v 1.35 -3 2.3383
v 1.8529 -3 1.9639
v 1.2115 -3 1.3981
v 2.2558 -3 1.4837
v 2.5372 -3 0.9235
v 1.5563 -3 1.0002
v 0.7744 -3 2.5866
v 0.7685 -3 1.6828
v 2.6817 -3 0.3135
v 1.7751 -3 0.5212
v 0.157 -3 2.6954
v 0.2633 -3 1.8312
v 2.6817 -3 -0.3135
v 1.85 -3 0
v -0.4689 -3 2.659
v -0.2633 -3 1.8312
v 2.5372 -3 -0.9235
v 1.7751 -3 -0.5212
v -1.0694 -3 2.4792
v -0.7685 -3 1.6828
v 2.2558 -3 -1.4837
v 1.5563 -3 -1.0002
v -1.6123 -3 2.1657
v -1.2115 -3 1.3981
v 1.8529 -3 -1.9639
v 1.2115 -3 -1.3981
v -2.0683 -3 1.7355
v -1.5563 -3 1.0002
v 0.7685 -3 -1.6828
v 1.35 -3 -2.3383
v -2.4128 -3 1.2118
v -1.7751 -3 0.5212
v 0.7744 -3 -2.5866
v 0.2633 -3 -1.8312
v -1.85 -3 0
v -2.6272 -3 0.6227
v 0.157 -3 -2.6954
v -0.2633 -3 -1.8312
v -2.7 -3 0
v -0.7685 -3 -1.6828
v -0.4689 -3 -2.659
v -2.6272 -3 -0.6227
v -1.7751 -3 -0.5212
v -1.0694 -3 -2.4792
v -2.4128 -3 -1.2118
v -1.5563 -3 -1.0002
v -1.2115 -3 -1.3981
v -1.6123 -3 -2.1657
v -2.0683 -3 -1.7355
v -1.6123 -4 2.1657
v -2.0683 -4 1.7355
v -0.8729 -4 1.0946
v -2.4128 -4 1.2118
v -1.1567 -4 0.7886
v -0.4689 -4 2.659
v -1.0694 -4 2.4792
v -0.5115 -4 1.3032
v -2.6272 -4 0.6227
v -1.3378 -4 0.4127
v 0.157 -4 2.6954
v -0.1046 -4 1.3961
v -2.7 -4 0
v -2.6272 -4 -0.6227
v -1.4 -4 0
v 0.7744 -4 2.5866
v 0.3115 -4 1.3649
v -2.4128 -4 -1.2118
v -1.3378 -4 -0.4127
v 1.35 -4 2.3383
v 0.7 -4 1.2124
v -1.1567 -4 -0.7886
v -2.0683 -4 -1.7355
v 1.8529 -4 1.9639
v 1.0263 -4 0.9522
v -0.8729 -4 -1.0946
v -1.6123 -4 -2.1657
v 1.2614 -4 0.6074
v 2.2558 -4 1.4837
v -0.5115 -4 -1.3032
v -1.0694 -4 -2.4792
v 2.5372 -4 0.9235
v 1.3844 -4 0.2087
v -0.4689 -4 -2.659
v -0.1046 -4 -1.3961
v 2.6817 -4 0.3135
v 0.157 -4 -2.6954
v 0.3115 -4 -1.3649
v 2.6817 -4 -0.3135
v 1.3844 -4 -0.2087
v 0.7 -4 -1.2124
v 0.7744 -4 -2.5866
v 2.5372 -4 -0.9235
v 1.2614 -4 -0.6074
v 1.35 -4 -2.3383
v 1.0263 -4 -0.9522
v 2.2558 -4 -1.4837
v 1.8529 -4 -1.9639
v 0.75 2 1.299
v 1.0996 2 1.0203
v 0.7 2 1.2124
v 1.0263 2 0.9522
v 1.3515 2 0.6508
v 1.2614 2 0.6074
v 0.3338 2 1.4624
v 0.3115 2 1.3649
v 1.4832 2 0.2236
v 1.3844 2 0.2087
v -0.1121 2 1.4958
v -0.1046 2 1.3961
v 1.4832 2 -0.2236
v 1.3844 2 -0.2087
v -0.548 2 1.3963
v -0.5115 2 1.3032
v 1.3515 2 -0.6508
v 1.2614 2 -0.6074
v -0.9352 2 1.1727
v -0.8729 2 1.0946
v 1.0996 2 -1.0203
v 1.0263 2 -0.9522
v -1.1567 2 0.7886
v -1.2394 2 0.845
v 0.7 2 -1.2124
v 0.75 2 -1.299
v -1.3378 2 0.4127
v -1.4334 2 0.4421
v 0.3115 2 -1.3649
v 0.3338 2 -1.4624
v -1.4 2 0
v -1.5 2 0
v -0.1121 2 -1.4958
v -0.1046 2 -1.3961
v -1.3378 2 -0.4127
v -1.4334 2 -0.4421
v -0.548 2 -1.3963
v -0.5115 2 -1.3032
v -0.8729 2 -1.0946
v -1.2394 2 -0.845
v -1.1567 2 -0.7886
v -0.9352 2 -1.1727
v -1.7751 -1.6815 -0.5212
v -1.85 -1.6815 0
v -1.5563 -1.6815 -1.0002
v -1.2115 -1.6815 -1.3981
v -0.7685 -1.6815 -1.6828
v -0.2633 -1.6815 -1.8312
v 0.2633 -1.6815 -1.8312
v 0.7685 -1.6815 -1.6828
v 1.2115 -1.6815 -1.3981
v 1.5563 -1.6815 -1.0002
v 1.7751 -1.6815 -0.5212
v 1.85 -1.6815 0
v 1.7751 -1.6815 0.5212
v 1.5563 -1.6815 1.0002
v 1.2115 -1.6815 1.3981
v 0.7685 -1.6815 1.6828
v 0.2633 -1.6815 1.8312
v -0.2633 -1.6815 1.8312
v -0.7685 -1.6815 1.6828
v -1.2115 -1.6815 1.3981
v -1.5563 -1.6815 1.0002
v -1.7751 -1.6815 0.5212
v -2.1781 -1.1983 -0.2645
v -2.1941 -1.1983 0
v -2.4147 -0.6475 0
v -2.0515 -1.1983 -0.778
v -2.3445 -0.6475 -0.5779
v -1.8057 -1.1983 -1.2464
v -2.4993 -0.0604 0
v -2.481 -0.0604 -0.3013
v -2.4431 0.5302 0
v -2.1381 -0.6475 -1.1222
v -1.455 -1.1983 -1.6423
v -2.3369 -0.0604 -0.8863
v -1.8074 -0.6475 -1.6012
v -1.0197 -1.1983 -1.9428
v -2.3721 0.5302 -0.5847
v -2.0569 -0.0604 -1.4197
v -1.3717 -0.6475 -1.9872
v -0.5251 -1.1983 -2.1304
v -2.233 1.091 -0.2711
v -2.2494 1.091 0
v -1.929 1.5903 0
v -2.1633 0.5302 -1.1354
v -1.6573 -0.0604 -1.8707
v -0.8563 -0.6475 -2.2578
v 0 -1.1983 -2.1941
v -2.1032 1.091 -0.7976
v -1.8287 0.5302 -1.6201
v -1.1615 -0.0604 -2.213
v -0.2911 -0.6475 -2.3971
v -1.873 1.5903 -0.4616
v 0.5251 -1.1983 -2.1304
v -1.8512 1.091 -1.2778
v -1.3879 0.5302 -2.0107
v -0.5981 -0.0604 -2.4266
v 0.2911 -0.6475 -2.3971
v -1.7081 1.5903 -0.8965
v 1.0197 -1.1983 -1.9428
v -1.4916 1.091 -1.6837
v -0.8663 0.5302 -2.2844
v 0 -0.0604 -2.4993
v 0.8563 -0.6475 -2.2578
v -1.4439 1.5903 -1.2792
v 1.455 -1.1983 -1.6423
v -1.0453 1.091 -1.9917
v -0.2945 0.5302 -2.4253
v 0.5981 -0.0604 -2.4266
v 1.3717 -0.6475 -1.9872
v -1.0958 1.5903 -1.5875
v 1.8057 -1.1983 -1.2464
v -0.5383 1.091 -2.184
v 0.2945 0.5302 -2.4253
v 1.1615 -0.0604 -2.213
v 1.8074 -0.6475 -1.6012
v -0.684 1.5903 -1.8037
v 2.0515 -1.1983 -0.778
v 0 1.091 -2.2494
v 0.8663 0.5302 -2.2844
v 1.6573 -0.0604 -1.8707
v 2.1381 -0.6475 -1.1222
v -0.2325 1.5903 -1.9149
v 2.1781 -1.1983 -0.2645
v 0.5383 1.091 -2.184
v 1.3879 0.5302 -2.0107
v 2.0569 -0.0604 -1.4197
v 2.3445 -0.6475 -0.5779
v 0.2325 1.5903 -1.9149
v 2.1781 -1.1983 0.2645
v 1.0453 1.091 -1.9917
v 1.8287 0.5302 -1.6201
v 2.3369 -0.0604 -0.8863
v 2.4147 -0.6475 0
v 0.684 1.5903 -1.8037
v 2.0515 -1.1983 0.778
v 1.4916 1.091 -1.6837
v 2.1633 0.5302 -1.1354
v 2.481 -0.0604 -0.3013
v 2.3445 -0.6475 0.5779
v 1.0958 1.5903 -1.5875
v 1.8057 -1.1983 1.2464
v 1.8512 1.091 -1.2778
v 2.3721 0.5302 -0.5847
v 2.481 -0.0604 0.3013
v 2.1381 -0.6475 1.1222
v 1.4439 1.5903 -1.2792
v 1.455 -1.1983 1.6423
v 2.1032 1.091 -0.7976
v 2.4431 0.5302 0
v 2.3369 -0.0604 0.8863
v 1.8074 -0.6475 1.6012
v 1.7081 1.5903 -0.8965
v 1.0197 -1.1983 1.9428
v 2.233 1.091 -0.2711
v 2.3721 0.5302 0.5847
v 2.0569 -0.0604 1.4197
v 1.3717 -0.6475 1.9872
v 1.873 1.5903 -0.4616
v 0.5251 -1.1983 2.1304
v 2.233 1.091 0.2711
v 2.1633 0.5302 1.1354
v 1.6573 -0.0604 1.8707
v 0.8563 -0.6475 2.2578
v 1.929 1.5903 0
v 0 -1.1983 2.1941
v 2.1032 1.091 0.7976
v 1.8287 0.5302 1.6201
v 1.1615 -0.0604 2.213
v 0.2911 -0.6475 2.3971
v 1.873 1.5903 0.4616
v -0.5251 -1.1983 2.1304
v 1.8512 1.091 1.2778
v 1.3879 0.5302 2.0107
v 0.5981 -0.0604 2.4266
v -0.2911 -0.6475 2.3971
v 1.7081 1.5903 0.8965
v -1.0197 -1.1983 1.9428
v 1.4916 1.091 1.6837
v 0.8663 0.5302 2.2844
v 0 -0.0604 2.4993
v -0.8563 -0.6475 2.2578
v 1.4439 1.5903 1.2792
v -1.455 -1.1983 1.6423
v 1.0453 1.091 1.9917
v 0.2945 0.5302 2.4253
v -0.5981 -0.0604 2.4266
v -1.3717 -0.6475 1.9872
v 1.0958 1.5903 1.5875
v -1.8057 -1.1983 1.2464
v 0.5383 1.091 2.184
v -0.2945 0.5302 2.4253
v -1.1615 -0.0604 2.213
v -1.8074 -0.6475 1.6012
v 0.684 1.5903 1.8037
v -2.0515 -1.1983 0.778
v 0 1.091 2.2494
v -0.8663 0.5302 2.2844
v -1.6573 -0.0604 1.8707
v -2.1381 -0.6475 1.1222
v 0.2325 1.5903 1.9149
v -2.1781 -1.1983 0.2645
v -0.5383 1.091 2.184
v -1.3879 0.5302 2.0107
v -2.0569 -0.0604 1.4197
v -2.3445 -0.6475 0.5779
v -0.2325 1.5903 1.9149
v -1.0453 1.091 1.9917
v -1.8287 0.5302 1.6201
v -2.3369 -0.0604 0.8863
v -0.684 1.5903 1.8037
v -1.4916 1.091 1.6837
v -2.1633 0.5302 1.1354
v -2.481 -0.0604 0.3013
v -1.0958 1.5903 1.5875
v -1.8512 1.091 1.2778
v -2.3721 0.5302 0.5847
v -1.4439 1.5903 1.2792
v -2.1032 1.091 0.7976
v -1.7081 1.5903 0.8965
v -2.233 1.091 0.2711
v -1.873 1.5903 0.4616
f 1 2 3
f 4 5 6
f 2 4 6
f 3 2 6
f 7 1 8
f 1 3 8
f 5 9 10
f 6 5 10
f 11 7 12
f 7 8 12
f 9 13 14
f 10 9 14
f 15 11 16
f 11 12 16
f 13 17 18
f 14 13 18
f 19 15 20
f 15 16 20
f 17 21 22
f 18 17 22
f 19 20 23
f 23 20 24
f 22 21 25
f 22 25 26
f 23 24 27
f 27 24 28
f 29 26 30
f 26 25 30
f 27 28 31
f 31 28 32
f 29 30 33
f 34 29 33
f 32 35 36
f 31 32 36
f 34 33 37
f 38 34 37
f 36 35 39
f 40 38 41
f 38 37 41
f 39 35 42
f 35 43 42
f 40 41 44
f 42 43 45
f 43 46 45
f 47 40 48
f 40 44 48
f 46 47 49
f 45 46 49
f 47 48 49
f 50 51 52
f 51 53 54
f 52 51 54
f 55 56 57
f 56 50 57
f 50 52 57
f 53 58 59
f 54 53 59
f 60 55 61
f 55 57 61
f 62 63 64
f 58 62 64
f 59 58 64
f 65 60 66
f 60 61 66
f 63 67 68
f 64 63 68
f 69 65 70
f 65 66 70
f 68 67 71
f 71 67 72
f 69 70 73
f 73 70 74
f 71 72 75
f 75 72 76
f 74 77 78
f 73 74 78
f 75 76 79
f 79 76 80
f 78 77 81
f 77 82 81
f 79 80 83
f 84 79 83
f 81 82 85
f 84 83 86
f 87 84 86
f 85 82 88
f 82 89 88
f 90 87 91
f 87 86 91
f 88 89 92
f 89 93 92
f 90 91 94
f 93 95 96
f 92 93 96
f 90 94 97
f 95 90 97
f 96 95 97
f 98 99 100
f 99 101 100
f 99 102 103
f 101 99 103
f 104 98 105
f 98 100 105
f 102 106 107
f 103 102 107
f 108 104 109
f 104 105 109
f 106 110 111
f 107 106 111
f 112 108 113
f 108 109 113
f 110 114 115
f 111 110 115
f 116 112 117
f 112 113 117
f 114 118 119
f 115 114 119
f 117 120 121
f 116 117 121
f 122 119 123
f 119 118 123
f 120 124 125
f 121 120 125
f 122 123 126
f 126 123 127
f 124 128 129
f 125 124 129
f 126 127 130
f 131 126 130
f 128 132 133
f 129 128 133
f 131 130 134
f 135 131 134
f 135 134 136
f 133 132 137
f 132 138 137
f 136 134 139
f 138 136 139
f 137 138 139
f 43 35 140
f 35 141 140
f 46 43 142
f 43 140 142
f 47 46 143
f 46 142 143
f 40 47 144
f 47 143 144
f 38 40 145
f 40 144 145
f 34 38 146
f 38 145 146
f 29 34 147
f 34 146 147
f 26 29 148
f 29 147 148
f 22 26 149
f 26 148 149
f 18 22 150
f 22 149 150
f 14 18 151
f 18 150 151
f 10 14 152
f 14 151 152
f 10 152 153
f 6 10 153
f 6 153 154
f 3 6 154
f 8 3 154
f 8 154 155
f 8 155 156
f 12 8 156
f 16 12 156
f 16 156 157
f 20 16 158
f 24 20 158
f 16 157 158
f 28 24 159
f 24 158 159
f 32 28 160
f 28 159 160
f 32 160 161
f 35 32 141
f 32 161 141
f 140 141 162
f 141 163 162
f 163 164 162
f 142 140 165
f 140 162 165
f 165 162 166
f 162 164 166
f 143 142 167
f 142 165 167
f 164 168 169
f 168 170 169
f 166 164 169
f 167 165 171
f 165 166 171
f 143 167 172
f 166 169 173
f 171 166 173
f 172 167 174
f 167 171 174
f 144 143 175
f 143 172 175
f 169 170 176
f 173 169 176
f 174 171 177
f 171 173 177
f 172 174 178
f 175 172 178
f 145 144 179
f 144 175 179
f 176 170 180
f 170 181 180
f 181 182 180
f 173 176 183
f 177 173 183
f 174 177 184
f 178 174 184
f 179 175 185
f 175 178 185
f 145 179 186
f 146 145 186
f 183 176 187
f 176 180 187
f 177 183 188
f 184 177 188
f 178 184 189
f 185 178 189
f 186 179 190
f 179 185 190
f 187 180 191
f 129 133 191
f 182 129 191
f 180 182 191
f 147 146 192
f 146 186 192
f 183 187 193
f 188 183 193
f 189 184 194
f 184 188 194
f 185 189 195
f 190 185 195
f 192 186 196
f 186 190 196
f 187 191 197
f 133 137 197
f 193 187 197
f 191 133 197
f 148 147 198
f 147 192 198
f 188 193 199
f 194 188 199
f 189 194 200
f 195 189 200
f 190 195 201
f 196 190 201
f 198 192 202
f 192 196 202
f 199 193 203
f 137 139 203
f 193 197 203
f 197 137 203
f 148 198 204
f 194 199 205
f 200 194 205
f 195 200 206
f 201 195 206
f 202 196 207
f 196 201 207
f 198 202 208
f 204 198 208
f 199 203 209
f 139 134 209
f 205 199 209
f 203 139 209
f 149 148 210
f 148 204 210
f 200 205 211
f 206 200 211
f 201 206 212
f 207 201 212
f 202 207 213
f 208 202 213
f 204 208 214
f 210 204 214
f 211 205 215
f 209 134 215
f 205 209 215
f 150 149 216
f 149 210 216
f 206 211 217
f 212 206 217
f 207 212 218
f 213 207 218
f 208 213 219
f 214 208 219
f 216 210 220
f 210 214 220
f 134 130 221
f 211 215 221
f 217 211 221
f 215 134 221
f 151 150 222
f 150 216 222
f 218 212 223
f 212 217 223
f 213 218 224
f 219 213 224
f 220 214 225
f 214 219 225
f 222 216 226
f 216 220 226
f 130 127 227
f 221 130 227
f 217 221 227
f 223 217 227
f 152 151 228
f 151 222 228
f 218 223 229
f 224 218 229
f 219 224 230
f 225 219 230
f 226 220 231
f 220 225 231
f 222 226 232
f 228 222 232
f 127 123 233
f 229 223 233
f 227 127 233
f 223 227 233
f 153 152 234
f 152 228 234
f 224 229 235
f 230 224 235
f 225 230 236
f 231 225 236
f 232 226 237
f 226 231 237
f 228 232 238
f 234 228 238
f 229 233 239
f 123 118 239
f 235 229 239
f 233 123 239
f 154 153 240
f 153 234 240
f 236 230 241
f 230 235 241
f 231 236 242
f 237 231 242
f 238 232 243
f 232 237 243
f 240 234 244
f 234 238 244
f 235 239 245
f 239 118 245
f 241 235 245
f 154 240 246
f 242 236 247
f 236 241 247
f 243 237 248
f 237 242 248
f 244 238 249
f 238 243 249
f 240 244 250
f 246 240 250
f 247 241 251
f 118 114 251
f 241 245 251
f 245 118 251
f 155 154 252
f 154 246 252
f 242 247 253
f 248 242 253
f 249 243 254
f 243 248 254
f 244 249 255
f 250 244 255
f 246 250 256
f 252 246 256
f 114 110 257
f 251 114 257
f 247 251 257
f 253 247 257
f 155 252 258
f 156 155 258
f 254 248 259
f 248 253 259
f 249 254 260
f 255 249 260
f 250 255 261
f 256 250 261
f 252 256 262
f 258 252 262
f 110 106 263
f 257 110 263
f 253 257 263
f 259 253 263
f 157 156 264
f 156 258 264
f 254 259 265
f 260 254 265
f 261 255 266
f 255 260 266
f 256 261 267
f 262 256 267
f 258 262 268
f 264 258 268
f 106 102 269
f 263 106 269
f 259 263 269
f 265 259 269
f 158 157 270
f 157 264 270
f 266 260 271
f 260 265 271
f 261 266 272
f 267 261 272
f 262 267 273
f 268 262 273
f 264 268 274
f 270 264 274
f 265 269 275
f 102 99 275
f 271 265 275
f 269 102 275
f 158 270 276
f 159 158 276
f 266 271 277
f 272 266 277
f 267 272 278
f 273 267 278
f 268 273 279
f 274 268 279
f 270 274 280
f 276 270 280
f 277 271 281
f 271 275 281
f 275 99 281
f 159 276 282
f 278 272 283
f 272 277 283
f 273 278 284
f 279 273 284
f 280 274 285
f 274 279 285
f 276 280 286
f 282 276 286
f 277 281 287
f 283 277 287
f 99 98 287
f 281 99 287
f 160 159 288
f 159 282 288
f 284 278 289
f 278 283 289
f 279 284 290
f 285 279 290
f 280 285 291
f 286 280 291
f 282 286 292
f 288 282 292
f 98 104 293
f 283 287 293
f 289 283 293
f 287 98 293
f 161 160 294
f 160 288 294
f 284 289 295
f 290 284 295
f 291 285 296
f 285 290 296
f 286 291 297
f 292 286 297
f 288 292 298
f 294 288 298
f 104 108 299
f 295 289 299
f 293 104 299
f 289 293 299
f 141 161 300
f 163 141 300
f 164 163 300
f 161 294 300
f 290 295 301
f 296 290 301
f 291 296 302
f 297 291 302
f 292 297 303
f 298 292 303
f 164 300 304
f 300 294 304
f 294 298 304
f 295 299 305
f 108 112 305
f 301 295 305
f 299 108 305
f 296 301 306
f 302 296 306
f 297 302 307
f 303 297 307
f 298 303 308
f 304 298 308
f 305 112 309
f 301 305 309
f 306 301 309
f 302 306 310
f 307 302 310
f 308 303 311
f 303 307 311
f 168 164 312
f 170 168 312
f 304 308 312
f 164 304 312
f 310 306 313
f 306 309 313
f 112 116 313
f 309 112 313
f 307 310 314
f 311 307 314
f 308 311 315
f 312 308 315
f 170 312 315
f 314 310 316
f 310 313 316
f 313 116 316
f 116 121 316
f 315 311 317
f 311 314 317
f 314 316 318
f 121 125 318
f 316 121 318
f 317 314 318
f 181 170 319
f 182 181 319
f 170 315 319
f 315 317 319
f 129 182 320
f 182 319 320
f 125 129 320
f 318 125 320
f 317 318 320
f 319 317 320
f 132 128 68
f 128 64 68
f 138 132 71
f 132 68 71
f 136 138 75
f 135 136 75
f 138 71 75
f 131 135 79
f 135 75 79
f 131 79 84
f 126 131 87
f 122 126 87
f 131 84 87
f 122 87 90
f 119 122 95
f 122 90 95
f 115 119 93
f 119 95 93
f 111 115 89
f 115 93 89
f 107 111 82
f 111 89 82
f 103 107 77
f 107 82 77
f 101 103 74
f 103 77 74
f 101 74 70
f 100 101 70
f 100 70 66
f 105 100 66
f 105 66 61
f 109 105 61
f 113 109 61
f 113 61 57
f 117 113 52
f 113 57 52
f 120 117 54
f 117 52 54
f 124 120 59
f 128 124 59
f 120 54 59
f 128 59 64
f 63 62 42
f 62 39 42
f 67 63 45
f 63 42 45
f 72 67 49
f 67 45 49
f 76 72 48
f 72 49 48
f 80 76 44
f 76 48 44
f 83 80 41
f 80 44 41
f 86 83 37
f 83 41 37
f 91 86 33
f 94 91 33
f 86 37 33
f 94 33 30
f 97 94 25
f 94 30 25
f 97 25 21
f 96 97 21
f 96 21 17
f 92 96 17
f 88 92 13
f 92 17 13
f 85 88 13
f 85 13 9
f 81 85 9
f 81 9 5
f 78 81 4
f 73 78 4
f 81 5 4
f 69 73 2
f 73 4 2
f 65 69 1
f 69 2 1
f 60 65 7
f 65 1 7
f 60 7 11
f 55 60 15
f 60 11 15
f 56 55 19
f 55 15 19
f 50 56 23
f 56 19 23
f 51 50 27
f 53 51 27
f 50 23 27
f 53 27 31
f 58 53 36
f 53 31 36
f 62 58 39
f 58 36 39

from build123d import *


with BuildPart() as part:
    # Esquisse1 → Révolution1 (revolve)
    with BuildSketch(Plane.XY, mode=Mode.PRIVATE) as r_volution1_sk:
        with BuildLine():
            Line((1.5, 2), (1.4, 2))
            Line((1.4, 2), (1.4, -4))
            Line((1.4, -4), (2.7, -4))
            Line((2.7, -4), (2.7, -3))
            Line((2.7, -3), (1.85, -3))
            Line((1.85, -3), (1.85, -1.681517172))
            ThreePointArc((1.85, -1.681517172), (2.488778249, 0.236606906), (1.5, 2))
        make_face()
    revolve(r_volution1_sk.sketch.rotate(Axis((0, 2, 0), (0, -1, 0)), 180), axis=Axis((0, 2, 0), (0, -1, 0)))


solid = part.part
